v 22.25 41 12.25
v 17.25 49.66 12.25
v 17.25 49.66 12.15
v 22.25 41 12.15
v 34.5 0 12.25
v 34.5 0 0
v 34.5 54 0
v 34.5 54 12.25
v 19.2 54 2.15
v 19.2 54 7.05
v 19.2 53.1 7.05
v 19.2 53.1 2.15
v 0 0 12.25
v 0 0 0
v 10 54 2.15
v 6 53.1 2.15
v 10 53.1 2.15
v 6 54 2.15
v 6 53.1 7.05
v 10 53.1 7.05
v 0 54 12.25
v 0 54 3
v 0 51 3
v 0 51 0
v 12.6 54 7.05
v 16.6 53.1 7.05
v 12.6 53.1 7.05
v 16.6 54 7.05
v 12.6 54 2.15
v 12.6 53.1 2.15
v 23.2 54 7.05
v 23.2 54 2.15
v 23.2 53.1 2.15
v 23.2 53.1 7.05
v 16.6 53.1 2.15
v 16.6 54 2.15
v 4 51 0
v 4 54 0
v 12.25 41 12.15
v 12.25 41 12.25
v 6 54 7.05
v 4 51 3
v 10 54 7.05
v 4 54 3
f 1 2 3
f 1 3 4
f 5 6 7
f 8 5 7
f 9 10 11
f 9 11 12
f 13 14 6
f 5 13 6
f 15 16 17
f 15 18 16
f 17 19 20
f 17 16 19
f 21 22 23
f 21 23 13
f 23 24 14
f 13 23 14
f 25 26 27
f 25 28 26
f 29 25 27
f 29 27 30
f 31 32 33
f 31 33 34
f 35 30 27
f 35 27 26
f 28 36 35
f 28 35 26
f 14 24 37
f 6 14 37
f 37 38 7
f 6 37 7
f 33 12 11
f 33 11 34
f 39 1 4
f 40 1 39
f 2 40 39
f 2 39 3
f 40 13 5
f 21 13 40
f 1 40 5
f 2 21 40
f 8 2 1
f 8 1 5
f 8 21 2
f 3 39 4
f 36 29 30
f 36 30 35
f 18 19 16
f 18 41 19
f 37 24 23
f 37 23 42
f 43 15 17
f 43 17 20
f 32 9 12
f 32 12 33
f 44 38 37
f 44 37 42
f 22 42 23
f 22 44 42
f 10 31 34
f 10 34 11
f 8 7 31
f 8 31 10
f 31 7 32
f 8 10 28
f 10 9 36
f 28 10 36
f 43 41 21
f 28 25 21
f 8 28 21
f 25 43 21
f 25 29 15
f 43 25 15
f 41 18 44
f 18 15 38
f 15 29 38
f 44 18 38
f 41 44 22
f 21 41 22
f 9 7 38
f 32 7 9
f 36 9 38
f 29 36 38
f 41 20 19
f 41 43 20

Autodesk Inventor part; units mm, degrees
ref_plane "YZ Plane" through (0, 0, 0) normal (1, 0, 0) x (0, 1, 0)
ref_plane "XZ Plane" through (0, 0, 0) normal (0, 1, 0) x (-1, 0, 0)
ref_plane "XY Plane" through (0, 0, 0) normal (0, 0, 1) x (1, 0, 0)
sketch "Sketch1" plane through (0, 0, 0) normal (0, 0, 1) x (1, 0, 0)
  line L0 (0, 0) -> (34.5, 0)
  line L1 (34.5, 0) -> (34.5, 54)
  line L2 (34.5, 54) -> (0, 54)
  line L3 (0, 54) -> (0, 0)
  dimension "d0" = 54
  dimension "d1" = 34.5
extrude "Extrusion1" add sketch "Sketch1" along normal blind 12.25
sketch "Sketch2" plane through (0, 0, 12.25) normal (0, 0, 1) x (1, 0, 0)
  line L0 (12.25, 41) -> (17.25, 49.6603)
  line L1 (17.25, 49.6603) -> (22.25, 41)
  line L2 (22.25, 41) -> (12.25, 41)
  line L3 (0, 0) -> (34.5, 0) construction
  point P0 (17.25, 41)
  point P1 (17.25, 0)
  dimension "d4" = 41
  dimension "d5" = 10
extrude "Extrusion2" cut sketch "Sketch2" against normal blind 0.1
sketch "Sketch3" plane through (0, 54, 0) normal (0, 1, 0) x (1, 0, 0)
  line L0 (34.5, 0) -> (0, 0) construction
  line L1 (0, 0) -> (0, -12.25) construction
  line L2 (34.5, -12.25) -> (0, -12.25) construction
  line L3 (34.5, 0) -> (34.5, -12.25) construction
  line L4 (4, 0) -> (4, -3)
  line L5 (4, -3) -> (0, -3)
  line L6 (4, 0) -> (0, 0)
  line L7 (0, -3) -> (0, 0)
  point P0 (0, 0)
  dimension "d8" = 3
  dimension "d9" = 4
extrude "Extrusion3" cut sketch "Sketch3" against normal blind 3
sketch "Sketch4" plane through (0, 54, 12.25) normal (0, 1, 0) x (1, 0, 0)
  line L0 (4, 12.25) -> (4, 9.25) projected
  line L1 (4, 9.25) -> (0, 9.25) projected
  line L2 (0, 9.25) -> (0, 0) projected
  line L3 (34.5, 0) -> (0, 0) projected
  line L4 (34.5, 12.25) -> (34.5, 0) projected
  line L5 (34.5, 12.25) -> (4, 12.25) projected
  line L6 (6, 10.1) -> (10, 10.1)
  line L7 (10, 10.1) -> (10, 5.2)
  line L8 (10, 5.2) -> (6, 5.2)
  line L9 (6, 5.2) -> (6, 10.1)
  line L10 (12.6, 10.1) -> (16.6, 10.1)
  line L11 (16.6, 10.1) -> (16.6, 5.2)
  line L12 (16.6, 5.2) -> (12.6, 5.2)
  line L13 (12.6, 5.2) -> (12.6, 10.1)
  line L14 (19.2, 10.1) -> (23.2, 10.1)
  line L15 (23.2, 10.1) -> (23.2, 5.2)
  line L16 (23.2, 5.2) -> (19.2, 5.2)
  line L17 (19.2, 5.2) -> (19.2, 10.1)
  line L18 (10, 10.1) -> (12.6, 10.1) construction
  line L19 (2, 4.16) -> (4.43, 4.16)
  line L20 (4.43, 4.16) -> (4.43, 8.8603)
  line L21 (4.43, 8.8603) -> (2, 8.8603)
  line L22 (2, 8.8603) -> (2, 4.16)
  point P0 (0, 12.25)
  dimension "d12" = 2.15
  dimension "d13" = 4.9
  dimension "d14" = 6
  dimension "d15" = 4
  dimension "d16" = 12.6
  dimension "d17" = 2.6
  dimension "d18" = 2.6
  dimension "d21" = 2
  dimension "d22" = 4.7003
  dimension "d23" = 2.43
  dimension "d24" = 4.16
extrude "Extrusion4" cut sketch "Sketch4" against normal blind 0.9 contours L6 L7 L8 L9 | L10 L11 L12 L13 | L14 L15 L16 L17
sketch "Sketch5" plane through (0, 54, 12.25) normal (0, 1, 0) x (1, 0, 0)
  line L0 (20.3264, 2.5717) -> (22.0736, 2.5717) construction
  line L1 (22.0736, 2.5717) -> (22.0736, 2.1463) construction
  line L2 (22.0736, 2.1463) -> (20.3264, 2.1463) construction
  line L3 (20.3264, 2.1463) -> (20.3264, 2.5717) construction
  line L4 (23.2, 5.2) -> (19.2, 5.2) projected
  line L5 (15.4736, 2.1463) -> (13.7264, 2.1463) construction
  line L6 (13.7264, 2.1463) -> (13.7264, 2.5717) construction
  line L7 (13.7264, 2.5717) -> (15.4736, 2.5717) construction
  line L8 (15.4736, 2.5717) -> (15.4736, 2.1463) construction
  line L9 (16.6, 5.2) -> (12.6, 5.2) projected
  line L10 (8.8736, 2.5717) -> (8.8736, 2.1463) construction
  line L11 (8.8736, 2.1463) -> (7.1264, 2.1463) construction
  line L12 (7.1264, 2.1463) -> (7.1264, 2.5717) construction
  line L13 (7.1264, 2.5717) -> (8.8736, 2.5717) construction
  line L14 (10, 5.2) -> (6, 5.2) projected
  point P0 (0, 12.25)
  point P1 (21.2, 5.2)
  point P2 (21.2, 2.5717)
  point P3 (14.6, 2.1463)
  point P4 (14.6, 5.2)
  point P5 (8, 2.1463)
  point P6 (8, 5.2)
  point P7 (20.3264, 2.359)
  point P8 (15.4736, 2.359)
  point P9 (8.8736, 2.359)
  dimension "d25" = 2.6283
  dimension "d26" = 1.7472
  dimension "d27" = 0.4254
equation "\"d18\" = d17"
properties part number "battery model"
